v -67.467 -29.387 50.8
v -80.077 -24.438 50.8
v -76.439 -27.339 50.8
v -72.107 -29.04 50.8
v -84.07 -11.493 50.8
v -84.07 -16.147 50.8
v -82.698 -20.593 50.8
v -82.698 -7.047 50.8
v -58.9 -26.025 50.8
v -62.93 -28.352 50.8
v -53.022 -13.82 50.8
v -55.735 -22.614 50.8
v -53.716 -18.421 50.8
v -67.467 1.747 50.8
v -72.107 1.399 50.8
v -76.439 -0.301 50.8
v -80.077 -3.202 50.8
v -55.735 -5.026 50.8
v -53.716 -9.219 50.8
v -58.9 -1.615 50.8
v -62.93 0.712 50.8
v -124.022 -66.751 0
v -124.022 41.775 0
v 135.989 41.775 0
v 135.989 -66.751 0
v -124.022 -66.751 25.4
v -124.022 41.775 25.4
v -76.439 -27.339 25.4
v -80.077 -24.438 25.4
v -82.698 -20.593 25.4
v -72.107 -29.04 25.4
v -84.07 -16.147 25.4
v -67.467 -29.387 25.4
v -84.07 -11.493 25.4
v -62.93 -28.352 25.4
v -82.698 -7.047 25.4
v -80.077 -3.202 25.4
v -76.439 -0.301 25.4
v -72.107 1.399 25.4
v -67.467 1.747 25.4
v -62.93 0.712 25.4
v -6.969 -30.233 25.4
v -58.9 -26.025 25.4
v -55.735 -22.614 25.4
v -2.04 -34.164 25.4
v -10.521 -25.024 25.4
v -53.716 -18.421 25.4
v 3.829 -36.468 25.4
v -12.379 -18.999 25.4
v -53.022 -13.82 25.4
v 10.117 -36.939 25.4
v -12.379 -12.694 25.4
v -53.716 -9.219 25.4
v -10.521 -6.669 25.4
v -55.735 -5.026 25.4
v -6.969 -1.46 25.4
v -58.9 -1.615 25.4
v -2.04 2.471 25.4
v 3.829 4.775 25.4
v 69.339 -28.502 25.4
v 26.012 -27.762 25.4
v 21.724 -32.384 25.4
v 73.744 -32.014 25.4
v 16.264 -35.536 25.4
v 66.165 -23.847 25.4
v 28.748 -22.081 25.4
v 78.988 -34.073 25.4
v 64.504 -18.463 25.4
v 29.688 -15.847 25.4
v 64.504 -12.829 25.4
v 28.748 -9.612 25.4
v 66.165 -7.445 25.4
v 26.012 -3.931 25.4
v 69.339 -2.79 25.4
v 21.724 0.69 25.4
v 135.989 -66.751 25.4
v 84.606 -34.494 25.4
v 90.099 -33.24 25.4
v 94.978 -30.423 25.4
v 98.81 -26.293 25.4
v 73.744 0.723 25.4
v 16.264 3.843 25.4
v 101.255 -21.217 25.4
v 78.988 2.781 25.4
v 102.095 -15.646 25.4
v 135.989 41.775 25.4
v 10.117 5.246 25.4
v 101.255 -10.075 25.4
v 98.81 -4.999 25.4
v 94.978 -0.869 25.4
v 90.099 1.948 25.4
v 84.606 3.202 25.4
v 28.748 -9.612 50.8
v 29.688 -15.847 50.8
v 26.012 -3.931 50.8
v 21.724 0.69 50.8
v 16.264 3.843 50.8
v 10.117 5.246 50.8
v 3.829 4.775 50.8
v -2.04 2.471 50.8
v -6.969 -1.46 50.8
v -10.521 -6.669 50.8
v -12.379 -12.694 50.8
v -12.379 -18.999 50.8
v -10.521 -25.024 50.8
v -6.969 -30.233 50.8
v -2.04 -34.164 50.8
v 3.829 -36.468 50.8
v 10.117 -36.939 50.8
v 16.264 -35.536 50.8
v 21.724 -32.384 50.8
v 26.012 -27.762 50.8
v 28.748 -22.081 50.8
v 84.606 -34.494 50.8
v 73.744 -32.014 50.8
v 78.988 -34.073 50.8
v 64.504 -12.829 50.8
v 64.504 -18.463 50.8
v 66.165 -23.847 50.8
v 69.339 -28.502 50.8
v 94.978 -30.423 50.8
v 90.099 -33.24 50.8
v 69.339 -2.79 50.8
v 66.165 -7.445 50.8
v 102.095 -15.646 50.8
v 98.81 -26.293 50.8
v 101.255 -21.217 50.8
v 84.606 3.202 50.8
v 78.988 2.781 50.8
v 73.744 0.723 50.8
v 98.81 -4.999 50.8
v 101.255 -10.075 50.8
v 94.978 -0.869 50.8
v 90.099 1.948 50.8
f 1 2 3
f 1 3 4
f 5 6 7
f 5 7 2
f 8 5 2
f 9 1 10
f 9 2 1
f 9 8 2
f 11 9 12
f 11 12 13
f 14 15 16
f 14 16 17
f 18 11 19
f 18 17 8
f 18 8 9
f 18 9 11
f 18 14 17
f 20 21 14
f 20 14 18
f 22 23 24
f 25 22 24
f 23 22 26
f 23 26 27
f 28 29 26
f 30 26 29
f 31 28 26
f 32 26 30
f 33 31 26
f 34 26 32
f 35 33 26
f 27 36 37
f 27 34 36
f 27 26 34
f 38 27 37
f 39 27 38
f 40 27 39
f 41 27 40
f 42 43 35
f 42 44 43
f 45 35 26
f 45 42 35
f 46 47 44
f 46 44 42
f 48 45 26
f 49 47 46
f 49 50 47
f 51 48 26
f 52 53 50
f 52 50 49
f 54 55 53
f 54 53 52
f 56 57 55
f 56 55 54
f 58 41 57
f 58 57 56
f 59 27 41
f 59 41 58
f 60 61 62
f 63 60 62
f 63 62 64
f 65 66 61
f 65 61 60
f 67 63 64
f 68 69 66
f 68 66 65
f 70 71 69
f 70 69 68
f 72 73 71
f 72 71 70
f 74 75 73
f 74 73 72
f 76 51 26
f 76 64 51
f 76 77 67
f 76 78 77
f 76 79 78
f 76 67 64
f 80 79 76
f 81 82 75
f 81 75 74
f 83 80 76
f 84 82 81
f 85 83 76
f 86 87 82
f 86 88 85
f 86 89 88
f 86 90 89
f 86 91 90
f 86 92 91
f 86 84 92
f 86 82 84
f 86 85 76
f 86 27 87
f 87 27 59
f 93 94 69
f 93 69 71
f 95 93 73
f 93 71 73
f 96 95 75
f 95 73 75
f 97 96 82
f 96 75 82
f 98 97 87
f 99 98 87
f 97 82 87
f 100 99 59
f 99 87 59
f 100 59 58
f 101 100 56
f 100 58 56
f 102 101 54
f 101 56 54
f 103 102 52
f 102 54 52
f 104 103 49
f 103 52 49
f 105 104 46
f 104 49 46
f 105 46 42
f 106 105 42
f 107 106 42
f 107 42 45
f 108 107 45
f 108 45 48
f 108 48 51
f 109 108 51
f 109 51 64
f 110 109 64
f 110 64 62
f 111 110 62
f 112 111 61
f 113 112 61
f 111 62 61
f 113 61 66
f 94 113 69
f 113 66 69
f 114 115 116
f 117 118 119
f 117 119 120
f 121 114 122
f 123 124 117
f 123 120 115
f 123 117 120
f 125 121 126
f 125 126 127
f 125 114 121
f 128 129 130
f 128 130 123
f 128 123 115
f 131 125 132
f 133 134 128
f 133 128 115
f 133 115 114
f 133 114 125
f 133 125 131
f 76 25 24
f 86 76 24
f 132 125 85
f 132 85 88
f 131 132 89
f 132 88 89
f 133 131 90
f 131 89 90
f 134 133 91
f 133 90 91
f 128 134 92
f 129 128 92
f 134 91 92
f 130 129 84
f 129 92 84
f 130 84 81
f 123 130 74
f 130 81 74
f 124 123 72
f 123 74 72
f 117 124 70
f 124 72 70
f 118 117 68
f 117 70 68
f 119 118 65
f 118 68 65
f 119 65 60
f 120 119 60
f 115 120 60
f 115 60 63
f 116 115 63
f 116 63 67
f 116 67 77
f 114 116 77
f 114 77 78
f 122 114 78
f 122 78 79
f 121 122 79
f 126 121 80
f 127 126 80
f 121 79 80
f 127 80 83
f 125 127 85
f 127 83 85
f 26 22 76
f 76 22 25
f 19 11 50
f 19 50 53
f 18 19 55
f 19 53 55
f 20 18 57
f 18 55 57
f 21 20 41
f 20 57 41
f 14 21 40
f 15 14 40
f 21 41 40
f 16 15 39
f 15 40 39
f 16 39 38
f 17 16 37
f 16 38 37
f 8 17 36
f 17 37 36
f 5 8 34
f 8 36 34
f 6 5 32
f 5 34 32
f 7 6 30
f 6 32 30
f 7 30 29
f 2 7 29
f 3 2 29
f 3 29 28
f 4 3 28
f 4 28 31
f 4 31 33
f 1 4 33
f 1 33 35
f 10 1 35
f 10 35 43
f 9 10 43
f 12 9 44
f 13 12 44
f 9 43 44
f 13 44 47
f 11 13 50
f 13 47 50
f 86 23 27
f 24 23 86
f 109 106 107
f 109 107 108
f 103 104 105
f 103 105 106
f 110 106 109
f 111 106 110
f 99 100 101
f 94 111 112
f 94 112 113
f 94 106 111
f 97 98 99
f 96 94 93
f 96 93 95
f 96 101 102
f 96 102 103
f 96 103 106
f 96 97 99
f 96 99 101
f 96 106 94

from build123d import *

# Parameters (mm, degrees)
F0_W     = 260.01095
F0_H     = 108.525954
F1_DEPTH = 25.4
F2_R     = 15.61088
F2_R_2   = 21.151668
F2_R_3   = 18.900746
F3_DEPTH = 25.4


with BuildPart() as f1:
    # F0 (on Top) → F1 (new body)
    with BuildSketch(Plane.XY):
        with Locations((5.983893, -12.487542)):
            Rectangle(F0_W, F0_H)
    extrude(amount=F1_DEPTH)

    # F2 (on face) → F3 (join)
    with BuildSketch(Plane.XY.offset(25.4)):
        with Locations((-68.63334, -13.820079)):
            Circle(F2_R)
        with Locations((8.536131, -15.846584)):
            Circle(F2_R_2)
        with Locations((83.193891, -15.645826)):
            Circle(F2_R_3)
    extrude(amount=F3_DEPTH)


solid = f1.part
